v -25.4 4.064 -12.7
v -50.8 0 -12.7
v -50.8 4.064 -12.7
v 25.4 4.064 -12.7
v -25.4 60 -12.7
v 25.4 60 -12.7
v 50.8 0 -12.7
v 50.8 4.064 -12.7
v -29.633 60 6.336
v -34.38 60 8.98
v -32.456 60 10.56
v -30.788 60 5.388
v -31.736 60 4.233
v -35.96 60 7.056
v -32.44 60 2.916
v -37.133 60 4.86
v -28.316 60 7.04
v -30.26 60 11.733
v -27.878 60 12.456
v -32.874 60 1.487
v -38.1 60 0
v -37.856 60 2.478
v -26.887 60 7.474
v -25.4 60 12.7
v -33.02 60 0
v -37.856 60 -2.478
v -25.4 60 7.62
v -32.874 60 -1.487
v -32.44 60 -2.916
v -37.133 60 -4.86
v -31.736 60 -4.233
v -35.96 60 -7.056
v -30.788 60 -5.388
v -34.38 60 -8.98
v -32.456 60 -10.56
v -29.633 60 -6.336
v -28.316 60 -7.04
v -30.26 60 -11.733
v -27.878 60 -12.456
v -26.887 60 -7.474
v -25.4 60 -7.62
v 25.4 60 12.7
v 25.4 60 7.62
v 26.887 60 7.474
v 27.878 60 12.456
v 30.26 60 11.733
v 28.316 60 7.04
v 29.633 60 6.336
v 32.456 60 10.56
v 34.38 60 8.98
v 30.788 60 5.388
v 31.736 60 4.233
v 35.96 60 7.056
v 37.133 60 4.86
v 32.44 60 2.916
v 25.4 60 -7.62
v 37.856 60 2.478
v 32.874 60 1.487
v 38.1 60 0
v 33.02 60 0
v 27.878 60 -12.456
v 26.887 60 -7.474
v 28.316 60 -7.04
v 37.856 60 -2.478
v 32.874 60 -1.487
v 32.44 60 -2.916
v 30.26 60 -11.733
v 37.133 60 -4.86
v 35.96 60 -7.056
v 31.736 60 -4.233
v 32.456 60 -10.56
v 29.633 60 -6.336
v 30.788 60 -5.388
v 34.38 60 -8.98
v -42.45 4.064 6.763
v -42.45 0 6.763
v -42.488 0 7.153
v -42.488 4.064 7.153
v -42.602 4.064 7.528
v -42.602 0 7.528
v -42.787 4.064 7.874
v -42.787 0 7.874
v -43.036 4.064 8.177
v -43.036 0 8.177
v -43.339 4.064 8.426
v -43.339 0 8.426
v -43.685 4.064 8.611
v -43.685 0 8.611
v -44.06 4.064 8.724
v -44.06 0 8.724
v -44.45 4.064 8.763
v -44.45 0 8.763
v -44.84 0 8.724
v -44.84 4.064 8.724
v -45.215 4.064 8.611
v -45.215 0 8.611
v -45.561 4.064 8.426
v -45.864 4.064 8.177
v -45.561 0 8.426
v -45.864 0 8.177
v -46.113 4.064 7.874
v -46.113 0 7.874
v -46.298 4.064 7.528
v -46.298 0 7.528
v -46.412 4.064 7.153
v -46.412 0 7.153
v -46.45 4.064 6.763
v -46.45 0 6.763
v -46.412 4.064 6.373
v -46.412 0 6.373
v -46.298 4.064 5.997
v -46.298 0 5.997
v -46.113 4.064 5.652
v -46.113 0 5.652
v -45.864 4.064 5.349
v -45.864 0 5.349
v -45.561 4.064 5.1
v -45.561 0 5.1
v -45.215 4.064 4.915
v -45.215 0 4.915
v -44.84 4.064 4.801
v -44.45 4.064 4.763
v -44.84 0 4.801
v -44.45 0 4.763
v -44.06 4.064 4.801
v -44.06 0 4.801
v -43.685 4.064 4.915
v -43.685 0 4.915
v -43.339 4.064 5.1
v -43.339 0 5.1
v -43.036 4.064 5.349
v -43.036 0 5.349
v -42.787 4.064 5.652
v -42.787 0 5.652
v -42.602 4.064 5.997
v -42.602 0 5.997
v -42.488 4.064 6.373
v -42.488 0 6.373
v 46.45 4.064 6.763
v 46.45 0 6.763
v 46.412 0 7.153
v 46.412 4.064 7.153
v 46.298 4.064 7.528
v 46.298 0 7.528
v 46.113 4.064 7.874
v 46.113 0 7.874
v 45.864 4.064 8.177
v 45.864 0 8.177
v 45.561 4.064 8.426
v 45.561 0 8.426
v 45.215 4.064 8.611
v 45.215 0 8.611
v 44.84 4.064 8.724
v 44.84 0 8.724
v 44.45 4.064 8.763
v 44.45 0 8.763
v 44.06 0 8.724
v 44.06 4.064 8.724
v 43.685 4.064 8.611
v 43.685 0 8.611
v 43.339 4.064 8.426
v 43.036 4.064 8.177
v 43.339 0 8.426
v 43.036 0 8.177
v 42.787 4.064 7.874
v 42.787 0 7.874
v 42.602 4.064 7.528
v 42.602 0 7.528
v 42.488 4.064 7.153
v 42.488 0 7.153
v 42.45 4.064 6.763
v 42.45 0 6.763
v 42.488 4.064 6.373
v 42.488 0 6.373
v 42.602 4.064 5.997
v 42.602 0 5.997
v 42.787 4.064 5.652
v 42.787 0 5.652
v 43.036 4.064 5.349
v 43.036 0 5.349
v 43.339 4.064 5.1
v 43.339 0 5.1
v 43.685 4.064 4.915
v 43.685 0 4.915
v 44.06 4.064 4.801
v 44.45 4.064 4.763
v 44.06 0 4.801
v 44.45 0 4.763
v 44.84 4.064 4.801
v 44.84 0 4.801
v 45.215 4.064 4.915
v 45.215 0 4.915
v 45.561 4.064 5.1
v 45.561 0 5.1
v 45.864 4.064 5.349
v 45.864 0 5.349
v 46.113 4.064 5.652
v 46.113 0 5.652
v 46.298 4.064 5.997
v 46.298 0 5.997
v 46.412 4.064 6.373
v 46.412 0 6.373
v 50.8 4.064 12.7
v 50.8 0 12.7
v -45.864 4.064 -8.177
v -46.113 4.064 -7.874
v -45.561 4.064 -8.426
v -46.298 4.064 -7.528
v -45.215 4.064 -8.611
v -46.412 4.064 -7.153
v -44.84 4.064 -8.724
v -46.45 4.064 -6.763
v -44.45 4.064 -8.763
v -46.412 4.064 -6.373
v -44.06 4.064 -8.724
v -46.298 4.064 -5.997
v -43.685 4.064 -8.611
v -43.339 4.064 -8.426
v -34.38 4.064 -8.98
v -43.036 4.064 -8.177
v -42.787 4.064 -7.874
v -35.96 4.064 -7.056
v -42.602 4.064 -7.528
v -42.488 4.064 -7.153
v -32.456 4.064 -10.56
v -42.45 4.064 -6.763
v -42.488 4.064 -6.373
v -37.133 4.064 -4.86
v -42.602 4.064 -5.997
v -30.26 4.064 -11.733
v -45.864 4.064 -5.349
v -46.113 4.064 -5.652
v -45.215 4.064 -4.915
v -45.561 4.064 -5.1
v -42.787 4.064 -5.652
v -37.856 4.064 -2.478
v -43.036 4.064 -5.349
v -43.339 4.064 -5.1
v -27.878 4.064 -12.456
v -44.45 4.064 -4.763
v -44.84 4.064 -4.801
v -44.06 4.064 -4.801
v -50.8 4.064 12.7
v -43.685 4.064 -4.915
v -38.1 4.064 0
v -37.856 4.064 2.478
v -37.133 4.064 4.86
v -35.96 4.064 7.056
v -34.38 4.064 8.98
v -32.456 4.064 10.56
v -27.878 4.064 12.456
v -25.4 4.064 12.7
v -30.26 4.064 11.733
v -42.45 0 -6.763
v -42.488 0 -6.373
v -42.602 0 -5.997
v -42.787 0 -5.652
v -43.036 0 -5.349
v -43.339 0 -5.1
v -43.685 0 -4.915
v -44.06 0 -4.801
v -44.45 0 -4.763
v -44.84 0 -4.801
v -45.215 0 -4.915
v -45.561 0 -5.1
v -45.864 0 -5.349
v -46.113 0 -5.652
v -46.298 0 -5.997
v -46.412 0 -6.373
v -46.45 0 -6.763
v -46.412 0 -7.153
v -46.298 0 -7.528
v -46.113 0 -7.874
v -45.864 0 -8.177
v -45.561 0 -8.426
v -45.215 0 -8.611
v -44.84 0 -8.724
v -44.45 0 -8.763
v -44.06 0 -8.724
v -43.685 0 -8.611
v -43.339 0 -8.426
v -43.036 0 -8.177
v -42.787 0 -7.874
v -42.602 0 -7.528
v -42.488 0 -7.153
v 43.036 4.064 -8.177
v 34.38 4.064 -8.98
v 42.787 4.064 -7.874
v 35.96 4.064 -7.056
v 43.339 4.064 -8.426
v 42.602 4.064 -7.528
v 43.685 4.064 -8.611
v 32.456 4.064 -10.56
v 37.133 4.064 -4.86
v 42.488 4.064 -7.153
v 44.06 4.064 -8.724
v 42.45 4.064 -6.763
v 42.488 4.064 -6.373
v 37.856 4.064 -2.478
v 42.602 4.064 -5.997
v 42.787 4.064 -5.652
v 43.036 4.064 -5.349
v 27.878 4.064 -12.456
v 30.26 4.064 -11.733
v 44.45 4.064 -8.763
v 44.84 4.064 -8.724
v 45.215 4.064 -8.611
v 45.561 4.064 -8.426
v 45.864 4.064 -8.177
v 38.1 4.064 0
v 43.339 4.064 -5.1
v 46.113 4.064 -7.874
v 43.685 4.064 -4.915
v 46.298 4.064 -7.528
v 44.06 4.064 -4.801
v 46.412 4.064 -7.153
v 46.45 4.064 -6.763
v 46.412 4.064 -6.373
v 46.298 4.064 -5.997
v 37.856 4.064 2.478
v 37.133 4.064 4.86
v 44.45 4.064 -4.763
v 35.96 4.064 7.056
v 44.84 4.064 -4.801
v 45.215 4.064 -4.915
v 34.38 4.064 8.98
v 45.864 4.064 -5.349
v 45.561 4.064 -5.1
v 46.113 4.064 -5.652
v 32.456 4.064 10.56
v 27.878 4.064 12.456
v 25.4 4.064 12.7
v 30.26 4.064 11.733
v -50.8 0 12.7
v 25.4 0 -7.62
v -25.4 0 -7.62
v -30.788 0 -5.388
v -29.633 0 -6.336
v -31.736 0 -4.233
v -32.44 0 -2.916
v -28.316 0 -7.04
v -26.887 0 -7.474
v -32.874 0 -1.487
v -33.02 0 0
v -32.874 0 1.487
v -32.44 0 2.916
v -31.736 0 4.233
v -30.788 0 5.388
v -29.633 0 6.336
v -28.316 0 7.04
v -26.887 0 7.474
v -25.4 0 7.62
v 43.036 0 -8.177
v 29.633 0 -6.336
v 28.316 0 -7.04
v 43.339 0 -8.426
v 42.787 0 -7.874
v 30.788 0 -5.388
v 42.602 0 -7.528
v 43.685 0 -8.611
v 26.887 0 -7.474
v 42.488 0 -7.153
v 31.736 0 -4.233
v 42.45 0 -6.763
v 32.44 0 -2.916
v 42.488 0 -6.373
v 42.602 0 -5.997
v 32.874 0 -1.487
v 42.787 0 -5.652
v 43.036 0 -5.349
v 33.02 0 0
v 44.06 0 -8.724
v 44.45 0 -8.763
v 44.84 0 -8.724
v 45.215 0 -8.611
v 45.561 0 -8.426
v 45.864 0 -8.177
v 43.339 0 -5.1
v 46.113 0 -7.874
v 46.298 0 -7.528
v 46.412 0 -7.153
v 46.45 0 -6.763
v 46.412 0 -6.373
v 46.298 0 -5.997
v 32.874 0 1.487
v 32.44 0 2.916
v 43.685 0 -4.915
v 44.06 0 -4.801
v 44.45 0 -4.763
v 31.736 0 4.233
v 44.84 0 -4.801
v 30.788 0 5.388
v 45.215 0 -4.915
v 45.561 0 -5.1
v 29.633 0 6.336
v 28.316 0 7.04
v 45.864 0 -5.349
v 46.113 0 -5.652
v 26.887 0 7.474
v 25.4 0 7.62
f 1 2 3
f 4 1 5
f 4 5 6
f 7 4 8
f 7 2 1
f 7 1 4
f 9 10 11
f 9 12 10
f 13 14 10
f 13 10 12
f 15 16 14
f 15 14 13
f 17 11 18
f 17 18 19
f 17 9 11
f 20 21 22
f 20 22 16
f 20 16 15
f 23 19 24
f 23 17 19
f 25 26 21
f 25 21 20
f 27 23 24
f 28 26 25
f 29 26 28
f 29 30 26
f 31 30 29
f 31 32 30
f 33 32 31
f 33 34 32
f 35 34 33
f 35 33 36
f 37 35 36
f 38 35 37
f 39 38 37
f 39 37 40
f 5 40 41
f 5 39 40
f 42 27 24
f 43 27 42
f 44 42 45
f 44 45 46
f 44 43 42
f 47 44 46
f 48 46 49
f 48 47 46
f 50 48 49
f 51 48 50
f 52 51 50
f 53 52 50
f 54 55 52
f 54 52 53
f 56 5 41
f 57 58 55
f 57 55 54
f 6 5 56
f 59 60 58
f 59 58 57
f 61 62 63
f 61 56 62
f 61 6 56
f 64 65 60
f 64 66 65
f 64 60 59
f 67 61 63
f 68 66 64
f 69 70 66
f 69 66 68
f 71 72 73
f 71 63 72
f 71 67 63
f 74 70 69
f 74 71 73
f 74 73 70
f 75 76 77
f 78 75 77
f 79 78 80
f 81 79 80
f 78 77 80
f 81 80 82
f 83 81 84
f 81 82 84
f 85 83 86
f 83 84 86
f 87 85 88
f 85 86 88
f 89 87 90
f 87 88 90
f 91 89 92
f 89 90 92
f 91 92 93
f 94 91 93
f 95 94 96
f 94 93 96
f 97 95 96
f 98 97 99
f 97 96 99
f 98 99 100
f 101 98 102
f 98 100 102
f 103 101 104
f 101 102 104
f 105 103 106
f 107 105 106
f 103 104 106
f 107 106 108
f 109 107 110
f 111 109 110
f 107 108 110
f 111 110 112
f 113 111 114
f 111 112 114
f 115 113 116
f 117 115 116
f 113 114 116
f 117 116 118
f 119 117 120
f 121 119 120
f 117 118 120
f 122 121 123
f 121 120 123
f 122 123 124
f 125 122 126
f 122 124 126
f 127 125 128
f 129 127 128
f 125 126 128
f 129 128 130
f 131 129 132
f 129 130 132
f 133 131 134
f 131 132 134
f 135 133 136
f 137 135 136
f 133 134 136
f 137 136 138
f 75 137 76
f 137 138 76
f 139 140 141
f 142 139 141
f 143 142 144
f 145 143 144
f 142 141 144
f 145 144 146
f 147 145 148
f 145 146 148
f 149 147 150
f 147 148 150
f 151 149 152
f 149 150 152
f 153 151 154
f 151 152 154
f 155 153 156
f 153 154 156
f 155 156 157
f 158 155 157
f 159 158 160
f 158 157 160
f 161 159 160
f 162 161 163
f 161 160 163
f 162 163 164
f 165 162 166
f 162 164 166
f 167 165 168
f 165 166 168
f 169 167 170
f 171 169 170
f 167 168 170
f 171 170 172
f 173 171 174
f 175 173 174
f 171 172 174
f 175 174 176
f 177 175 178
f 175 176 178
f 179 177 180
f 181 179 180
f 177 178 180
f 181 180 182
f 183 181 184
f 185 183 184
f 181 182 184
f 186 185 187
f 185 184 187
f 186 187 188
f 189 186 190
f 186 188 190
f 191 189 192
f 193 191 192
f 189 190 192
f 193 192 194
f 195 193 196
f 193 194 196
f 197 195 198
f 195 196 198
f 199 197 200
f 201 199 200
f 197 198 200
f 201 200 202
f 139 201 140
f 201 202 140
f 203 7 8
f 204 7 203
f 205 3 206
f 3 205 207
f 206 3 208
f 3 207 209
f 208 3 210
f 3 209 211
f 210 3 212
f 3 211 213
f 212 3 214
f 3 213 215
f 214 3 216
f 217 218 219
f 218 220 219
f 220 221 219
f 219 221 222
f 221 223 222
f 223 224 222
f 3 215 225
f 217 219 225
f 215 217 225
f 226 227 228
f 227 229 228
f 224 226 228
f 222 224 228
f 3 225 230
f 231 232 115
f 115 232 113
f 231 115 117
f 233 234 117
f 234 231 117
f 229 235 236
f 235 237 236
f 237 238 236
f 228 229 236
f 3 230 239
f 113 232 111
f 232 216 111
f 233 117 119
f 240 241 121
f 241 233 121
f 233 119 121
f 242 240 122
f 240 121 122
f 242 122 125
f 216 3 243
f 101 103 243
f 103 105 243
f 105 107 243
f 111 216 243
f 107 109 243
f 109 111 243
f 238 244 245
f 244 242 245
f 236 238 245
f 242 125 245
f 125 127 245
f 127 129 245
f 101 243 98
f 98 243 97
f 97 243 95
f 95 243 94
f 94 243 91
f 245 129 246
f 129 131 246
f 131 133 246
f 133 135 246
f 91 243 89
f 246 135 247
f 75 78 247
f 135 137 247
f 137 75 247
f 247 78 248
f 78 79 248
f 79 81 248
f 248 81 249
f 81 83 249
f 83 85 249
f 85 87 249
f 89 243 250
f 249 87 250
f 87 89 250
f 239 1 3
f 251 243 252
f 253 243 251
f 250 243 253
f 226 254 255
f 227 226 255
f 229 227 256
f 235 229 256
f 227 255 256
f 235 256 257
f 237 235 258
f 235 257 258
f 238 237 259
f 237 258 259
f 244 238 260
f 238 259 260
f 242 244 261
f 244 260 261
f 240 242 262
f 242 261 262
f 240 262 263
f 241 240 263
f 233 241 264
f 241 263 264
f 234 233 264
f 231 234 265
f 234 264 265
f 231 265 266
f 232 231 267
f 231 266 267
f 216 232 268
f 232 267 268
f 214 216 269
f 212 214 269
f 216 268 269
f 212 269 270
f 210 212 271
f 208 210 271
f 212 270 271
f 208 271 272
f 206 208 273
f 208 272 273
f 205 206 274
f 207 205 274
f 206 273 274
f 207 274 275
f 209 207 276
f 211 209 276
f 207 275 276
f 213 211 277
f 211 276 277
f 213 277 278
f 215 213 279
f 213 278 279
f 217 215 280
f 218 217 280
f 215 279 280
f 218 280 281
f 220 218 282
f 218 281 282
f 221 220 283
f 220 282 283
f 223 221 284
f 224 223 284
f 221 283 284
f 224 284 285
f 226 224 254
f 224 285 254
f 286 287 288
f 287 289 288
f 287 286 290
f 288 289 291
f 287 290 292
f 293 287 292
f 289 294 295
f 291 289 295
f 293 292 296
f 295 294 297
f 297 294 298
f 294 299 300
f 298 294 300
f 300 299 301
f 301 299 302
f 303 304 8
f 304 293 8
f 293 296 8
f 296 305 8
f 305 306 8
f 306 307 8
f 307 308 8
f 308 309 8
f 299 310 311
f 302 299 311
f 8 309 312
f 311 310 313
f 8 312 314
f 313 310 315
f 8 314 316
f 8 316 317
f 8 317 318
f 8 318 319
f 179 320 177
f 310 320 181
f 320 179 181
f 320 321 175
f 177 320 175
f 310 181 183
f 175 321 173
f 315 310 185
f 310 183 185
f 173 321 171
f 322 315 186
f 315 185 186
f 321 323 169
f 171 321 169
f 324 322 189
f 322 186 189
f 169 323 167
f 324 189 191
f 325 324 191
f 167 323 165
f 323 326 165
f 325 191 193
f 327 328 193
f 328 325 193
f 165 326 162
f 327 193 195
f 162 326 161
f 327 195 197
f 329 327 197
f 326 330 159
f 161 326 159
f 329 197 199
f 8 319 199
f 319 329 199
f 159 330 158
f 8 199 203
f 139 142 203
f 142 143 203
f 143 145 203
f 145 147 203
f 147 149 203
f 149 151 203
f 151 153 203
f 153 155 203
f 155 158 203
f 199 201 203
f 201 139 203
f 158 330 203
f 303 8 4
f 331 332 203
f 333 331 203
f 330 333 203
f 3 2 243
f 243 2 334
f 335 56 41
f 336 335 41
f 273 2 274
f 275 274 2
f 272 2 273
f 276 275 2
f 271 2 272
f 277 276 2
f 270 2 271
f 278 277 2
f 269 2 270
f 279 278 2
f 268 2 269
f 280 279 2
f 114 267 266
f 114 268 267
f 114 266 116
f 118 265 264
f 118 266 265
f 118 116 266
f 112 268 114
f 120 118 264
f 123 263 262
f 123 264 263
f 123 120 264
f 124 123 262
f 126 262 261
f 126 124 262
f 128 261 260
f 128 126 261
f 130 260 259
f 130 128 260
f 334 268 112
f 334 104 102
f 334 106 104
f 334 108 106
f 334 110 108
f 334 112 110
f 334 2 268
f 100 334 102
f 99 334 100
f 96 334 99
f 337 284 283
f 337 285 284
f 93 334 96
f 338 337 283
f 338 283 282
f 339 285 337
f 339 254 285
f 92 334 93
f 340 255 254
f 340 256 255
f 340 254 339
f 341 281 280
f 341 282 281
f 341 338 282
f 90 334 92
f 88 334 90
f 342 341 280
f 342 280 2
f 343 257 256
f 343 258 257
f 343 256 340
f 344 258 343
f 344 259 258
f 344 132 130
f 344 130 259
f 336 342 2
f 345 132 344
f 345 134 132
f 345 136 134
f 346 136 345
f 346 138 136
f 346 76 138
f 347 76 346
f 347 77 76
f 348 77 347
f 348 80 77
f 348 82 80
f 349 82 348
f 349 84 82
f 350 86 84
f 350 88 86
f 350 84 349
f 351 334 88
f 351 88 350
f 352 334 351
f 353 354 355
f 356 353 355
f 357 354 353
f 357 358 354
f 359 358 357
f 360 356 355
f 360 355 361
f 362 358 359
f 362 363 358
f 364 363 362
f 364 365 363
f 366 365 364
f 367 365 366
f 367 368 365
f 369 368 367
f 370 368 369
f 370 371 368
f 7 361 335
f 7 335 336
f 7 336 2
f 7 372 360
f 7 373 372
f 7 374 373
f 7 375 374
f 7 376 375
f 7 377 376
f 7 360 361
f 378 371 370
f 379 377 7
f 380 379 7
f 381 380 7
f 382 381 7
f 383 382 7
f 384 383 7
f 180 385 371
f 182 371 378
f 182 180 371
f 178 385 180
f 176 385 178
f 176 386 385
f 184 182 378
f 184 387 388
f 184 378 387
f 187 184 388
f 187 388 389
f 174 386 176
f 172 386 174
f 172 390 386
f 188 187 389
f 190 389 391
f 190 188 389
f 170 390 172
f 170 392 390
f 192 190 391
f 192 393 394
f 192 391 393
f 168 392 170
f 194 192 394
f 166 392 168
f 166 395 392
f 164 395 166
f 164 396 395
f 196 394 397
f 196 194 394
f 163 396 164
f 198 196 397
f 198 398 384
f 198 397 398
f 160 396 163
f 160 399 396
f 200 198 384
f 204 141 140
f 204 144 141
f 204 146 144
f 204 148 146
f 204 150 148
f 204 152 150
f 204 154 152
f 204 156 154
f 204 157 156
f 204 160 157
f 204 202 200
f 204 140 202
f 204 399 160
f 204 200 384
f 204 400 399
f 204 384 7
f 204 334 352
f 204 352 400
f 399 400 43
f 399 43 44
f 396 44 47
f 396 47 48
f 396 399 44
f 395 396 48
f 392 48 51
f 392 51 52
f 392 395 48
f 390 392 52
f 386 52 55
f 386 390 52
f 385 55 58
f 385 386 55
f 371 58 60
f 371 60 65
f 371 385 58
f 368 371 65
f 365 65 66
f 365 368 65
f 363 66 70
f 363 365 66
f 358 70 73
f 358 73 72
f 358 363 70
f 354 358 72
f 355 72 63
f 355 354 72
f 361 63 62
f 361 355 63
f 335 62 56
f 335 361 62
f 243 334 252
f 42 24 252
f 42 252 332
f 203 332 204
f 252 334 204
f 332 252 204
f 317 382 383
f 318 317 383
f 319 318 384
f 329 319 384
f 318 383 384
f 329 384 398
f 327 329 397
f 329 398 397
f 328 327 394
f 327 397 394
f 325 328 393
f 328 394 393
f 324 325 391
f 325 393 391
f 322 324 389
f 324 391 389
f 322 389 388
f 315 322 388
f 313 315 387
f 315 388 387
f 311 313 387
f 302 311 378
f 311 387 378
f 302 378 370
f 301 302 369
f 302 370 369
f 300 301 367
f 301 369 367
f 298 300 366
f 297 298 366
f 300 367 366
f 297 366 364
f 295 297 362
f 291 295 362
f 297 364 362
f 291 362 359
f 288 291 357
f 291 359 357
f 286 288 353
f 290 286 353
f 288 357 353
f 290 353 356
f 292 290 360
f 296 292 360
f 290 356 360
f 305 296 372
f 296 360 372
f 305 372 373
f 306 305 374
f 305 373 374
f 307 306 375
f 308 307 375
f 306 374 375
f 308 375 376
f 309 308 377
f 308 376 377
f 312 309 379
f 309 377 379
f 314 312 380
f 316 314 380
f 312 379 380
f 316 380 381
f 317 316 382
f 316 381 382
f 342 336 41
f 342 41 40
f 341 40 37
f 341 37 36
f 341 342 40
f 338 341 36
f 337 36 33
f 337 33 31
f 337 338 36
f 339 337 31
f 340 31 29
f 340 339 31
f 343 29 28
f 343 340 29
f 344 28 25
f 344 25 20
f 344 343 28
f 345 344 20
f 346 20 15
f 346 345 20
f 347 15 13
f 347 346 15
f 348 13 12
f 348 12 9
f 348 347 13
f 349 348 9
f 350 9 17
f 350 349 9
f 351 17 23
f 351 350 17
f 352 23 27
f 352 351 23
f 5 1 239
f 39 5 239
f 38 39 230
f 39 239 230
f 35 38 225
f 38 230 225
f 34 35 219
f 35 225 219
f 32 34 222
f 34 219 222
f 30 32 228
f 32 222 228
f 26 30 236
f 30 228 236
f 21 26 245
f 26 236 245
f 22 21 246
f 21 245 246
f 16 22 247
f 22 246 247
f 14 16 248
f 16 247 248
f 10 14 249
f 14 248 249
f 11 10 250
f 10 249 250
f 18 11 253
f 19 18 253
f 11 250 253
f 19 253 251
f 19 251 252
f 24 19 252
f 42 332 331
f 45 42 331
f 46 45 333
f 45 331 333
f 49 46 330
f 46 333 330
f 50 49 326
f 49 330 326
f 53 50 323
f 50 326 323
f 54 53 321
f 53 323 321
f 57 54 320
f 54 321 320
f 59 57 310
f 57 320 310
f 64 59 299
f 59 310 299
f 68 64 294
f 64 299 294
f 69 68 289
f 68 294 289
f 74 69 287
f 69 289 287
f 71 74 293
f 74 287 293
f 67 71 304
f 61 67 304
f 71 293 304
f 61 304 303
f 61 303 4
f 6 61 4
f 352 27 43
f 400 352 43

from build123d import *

# Parameters (mm, degrees)
BOSS_EXTRUDE1_DEPTH = 60
SKETCH2_W           = 101.6
SKETCH2_H           = 25.4
SKETCH2_R           = 2
BOSS_EXTRUDE2_DEPTH = 4.064


with BuildPart() as part:
    # Sketch1 → Boss-Extrude1 (new body)
    with BuildSketch(Plane(origin=(0, 0, 0), x_dir=(1, 0, 0), z_dir=(0, 1, 0))):
        with BuildLine():
            Line((-25.4, -12.7), (25.4, -12.7))
            ThreePointArc((25.4, -12.7), (38.1, 0), (25.4, 12.7))
            Line((25.4, 12.7), (-25.4, 12.7))
            ThreePointArc((-25.4, 12.7), (-38.1, 0), (-25.4, -12.7))
        make_face()
        with BuildLine():
            Line((-25.4, -7.62), (25.4, -7.62))
            ThreePointArc((25.4, -7.62), (33.02, 0), (25.4, 7.62))
            Line((25.4, 7.62), (-25.4, 7.62))
            ThreePointArc((-25.4, 7.62), (-33.02, 0), (-25.4, -7.62))
        make_face(mode=Mode.SUBTRACT)
    extrude(amount=BOSS_EXTRUDE1_DEPTH)

    # Sketch2 → Boss-Extrude2 (add)
    with BuildSketch(Plane.XZ):
        Rectangle(SKETCH2_W, SKETCH2_H)
        with Locations((-44.45, -6.762856744)):
            Circle(SKETCH2_R, mode=Mode.SUBTRACT)
        with Locations((-44.45, 6.762856744)):
            Circle(SKETCH2_R, mode=Mode.SUBTRACT)
        with Locations((44.45, 6.762856744)):
            Circle(SKETCH2_R, mode=Mode.SUBTRACT)
        with Locations((44.45, -6.762856744)):
            Circle(SKETCH2_R, mode=Mode.SUBTRACT)
        with BuildLine():
            Line((-25.4, -7.62), (25.4, -7.62))
            ThreePointArc((25.4, -7.62), (33.02, 0), (25.4, 7.62))
            Line((25.4, 7.62), (-25.4, 7.62))
            ThreePointArc((-25.4, 7.62), (-33.02, 0), (-25.4, -7.62))
        make_face(mode=Mode.SUBTRACT)
    extrude(amount=-BOSS_EXTRUDE2_DEPTH)


solid = part.part
